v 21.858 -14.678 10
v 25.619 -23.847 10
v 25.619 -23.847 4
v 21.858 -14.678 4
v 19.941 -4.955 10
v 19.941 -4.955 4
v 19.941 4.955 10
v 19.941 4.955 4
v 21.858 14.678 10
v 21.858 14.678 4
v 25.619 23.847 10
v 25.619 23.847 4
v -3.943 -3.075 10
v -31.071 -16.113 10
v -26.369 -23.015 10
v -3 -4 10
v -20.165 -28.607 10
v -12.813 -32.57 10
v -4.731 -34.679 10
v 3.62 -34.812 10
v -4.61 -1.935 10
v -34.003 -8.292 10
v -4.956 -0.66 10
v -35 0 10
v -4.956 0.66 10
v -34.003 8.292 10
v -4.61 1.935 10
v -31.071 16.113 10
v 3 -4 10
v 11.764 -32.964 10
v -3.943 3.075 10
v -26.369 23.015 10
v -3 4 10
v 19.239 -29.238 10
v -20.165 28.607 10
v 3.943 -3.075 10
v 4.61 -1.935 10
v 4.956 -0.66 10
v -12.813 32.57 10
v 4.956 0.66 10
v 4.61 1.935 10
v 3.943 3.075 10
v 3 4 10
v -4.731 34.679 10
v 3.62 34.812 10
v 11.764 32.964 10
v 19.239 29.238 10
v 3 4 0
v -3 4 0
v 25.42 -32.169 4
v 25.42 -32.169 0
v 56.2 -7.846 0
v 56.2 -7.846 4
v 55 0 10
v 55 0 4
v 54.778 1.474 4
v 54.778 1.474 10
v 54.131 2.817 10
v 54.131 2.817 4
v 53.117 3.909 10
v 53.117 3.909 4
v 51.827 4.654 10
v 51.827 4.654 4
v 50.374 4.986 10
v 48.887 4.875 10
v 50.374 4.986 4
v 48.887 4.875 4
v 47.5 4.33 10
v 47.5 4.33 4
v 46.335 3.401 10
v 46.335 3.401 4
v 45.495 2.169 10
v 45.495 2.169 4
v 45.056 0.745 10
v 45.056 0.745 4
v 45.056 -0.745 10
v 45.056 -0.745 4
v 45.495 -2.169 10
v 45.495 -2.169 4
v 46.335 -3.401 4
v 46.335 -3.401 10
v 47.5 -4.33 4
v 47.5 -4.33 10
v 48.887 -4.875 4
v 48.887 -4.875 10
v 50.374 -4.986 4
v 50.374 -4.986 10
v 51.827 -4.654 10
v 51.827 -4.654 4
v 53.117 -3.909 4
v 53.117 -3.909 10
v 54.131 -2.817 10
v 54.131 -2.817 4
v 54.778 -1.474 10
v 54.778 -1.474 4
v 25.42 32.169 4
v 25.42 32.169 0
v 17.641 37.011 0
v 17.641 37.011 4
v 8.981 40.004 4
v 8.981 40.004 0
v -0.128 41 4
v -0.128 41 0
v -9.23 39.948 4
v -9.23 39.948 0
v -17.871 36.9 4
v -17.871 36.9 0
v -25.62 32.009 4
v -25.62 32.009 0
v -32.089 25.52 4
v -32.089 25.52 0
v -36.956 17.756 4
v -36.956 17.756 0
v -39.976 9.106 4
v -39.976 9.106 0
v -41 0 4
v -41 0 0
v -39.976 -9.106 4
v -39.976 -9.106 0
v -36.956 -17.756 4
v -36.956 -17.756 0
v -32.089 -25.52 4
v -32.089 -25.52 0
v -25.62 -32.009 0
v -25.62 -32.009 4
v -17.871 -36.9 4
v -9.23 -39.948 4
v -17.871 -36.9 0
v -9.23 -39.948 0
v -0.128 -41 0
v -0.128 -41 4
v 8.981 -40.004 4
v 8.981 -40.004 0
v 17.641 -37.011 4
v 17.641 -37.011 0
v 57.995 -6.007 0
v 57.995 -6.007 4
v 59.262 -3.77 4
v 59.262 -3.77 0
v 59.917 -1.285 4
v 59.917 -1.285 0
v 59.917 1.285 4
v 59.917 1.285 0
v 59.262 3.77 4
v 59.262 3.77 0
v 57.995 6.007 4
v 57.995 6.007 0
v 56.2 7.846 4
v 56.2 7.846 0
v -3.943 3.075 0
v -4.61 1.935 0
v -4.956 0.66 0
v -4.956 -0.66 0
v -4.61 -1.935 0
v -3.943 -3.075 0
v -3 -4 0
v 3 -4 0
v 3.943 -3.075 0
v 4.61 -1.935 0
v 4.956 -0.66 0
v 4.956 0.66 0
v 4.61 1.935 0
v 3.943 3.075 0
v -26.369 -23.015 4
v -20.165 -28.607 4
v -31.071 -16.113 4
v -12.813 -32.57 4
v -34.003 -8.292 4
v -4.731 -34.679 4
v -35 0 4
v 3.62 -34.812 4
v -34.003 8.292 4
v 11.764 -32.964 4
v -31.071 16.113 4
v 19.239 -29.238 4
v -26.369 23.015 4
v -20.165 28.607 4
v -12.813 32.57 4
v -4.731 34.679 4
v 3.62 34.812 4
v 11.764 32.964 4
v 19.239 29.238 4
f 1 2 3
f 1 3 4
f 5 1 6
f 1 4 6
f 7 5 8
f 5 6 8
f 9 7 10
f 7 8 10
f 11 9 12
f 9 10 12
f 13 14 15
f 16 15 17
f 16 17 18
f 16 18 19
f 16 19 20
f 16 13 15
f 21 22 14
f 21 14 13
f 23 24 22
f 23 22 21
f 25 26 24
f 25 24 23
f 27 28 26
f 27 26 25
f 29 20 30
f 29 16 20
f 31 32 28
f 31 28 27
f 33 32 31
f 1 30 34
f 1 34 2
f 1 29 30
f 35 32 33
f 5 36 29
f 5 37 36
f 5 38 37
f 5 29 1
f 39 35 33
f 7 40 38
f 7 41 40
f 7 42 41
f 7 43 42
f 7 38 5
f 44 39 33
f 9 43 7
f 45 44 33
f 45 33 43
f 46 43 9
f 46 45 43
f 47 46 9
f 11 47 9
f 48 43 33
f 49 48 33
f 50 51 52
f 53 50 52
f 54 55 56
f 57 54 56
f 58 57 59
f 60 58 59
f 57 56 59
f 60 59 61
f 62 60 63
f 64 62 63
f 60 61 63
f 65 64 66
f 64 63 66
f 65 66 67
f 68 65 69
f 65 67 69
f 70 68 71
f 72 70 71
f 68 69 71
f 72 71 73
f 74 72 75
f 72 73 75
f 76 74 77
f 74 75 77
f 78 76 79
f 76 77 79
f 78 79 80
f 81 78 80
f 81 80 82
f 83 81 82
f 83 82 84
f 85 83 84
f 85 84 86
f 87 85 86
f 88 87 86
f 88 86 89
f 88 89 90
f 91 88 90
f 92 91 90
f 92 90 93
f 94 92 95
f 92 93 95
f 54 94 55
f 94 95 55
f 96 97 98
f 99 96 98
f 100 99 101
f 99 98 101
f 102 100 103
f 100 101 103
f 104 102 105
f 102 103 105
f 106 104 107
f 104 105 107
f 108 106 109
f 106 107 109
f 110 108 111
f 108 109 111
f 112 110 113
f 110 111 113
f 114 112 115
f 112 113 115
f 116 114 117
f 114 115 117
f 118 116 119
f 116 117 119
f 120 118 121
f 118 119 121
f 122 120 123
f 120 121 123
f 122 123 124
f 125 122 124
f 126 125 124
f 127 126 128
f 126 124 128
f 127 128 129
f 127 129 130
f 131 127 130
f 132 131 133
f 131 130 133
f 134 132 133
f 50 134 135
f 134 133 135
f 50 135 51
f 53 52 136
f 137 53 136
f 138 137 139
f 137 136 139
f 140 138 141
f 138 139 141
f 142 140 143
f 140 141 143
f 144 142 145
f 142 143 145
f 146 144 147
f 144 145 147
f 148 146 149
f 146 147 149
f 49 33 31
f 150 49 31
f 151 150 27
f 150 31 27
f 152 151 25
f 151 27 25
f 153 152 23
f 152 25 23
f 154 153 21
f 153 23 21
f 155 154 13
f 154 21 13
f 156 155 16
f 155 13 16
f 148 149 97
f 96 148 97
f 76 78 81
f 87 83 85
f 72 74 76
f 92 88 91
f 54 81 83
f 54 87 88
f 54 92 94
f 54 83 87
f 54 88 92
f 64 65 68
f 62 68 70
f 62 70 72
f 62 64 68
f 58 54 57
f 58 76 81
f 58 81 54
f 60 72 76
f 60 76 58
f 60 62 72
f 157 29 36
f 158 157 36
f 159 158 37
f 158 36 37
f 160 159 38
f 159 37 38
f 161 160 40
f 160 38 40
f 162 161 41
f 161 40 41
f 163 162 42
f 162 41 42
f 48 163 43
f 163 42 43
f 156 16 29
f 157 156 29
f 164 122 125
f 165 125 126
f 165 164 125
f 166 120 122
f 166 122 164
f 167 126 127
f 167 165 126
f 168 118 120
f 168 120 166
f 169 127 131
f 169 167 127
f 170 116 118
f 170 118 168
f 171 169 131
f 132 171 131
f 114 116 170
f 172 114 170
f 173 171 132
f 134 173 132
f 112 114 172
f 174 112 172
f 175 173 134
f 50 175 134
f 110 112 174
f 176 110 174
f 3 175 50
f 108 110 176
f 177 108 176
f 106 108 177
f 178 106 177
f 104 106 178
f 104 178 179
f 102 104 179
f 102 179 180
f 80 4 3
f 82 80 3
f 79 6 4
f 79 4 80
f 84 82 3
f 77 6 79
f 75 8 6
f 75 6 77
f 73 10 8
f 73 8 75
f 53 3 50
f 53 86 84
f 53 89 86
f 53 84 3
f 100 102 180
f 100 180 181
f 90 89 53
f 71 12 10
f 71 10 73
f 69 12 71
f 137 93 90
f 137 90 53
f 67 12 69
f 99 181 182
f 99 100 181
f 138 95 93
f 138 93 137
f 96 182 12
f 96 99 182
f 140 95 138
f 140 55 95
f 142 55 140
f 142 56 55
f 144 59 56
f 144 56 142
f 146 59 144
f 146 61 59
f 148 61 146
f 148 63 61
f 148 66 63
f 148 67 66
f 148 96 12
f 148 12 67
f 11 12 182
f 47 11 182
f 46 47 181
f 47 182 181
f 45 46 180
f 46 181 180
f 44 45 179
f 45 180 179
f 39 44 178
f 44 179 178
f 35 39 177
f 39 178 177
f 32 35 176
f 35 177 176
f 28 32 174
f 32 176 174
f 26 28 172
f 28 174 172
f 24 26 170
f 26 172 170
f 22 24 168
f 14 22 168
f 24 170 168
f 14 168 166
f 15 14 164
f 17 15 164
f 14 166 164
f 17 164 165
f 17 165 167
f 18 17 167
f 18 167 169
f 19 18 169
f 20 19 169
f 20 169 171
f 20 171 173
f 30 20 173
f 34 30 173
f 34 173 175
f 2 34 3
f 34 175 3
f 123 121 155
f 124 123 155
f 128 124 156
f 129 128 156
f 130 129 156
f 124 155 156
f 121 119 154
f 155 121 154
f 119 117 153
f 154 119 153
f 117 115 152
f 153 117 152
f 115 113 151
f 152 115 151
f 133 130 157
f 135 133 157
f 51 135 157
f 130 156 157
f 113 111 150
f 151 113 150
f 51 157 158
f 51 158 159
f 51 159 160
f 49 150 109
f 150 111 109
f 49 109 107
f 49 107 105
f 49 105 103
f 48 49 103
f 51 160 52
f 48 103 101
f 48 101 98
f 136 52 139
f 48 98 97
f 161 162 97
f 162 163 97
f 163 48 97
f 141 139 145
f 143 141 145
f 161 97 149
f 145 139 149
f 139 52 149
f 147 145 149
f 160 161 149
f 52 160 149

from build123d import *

# Parameters (mm, degrees)
F1_DEPTH = 4
F3_DEPTH = 6
F4_R     = 5
F5_DEPTH = 6
F7_DEPTH = 10.001


with BuildPart() as f1:
    # F0 (on Top) → F1 (new body)
    with BuildSketch(Plane.XY):
        with BuildLine():
            Line((56.2, 7.846018), (25.42, 32.168674))
            ThreePointArc((25.42, 32.168674), (-41, 0), (25.42, -32.168674))
            Line((25.42, -32.168674), (56.2, -7.846018))
            ThreePointArc((56.2, -7.846018), (60, 0), (56.2, 7.846018))
        make_face()
    extrude(amount=F1_DEPTH)

    # F2 (on face) → F3 (join)
    with BuildSketch(Plane.XY.offset(4)):
        with BuildLine():
            ThreePointArc((25.618741, -23.847015), (19.7, 0), (25.618741, 23.847015))
            ThreePointArc((25.618741, 23.847015), (-35, 0), (25.618741, -23.847015))
        make_face()
    extrude(amount=F3_DEPTH)

    # F4 (on face) → F5 (join)
    with BuildSketch(Plane.XY.offset(4)):
        with Locations((50, 0)):
            Circle(F4_R)
    extrude(amount=F5_DEPTH)

    # F6 (on face) → F7 (cut, through all)
    with BuildSketch(Plane.XY.offset(10)):
        with BuildLine():
            Line((3, 4), (-3, 4))
            ThreePointArc((-3, 4), (-5, 0), (-3, -4))
            Line((-3, -4), (3, -4))
            ThreePointArc((3, -4), (5, 0), (3, 4))
        make_face()
    extrude(amount=-F7_DEPTH, mode=Mode.SUBTRACT)


solid = f1.part
